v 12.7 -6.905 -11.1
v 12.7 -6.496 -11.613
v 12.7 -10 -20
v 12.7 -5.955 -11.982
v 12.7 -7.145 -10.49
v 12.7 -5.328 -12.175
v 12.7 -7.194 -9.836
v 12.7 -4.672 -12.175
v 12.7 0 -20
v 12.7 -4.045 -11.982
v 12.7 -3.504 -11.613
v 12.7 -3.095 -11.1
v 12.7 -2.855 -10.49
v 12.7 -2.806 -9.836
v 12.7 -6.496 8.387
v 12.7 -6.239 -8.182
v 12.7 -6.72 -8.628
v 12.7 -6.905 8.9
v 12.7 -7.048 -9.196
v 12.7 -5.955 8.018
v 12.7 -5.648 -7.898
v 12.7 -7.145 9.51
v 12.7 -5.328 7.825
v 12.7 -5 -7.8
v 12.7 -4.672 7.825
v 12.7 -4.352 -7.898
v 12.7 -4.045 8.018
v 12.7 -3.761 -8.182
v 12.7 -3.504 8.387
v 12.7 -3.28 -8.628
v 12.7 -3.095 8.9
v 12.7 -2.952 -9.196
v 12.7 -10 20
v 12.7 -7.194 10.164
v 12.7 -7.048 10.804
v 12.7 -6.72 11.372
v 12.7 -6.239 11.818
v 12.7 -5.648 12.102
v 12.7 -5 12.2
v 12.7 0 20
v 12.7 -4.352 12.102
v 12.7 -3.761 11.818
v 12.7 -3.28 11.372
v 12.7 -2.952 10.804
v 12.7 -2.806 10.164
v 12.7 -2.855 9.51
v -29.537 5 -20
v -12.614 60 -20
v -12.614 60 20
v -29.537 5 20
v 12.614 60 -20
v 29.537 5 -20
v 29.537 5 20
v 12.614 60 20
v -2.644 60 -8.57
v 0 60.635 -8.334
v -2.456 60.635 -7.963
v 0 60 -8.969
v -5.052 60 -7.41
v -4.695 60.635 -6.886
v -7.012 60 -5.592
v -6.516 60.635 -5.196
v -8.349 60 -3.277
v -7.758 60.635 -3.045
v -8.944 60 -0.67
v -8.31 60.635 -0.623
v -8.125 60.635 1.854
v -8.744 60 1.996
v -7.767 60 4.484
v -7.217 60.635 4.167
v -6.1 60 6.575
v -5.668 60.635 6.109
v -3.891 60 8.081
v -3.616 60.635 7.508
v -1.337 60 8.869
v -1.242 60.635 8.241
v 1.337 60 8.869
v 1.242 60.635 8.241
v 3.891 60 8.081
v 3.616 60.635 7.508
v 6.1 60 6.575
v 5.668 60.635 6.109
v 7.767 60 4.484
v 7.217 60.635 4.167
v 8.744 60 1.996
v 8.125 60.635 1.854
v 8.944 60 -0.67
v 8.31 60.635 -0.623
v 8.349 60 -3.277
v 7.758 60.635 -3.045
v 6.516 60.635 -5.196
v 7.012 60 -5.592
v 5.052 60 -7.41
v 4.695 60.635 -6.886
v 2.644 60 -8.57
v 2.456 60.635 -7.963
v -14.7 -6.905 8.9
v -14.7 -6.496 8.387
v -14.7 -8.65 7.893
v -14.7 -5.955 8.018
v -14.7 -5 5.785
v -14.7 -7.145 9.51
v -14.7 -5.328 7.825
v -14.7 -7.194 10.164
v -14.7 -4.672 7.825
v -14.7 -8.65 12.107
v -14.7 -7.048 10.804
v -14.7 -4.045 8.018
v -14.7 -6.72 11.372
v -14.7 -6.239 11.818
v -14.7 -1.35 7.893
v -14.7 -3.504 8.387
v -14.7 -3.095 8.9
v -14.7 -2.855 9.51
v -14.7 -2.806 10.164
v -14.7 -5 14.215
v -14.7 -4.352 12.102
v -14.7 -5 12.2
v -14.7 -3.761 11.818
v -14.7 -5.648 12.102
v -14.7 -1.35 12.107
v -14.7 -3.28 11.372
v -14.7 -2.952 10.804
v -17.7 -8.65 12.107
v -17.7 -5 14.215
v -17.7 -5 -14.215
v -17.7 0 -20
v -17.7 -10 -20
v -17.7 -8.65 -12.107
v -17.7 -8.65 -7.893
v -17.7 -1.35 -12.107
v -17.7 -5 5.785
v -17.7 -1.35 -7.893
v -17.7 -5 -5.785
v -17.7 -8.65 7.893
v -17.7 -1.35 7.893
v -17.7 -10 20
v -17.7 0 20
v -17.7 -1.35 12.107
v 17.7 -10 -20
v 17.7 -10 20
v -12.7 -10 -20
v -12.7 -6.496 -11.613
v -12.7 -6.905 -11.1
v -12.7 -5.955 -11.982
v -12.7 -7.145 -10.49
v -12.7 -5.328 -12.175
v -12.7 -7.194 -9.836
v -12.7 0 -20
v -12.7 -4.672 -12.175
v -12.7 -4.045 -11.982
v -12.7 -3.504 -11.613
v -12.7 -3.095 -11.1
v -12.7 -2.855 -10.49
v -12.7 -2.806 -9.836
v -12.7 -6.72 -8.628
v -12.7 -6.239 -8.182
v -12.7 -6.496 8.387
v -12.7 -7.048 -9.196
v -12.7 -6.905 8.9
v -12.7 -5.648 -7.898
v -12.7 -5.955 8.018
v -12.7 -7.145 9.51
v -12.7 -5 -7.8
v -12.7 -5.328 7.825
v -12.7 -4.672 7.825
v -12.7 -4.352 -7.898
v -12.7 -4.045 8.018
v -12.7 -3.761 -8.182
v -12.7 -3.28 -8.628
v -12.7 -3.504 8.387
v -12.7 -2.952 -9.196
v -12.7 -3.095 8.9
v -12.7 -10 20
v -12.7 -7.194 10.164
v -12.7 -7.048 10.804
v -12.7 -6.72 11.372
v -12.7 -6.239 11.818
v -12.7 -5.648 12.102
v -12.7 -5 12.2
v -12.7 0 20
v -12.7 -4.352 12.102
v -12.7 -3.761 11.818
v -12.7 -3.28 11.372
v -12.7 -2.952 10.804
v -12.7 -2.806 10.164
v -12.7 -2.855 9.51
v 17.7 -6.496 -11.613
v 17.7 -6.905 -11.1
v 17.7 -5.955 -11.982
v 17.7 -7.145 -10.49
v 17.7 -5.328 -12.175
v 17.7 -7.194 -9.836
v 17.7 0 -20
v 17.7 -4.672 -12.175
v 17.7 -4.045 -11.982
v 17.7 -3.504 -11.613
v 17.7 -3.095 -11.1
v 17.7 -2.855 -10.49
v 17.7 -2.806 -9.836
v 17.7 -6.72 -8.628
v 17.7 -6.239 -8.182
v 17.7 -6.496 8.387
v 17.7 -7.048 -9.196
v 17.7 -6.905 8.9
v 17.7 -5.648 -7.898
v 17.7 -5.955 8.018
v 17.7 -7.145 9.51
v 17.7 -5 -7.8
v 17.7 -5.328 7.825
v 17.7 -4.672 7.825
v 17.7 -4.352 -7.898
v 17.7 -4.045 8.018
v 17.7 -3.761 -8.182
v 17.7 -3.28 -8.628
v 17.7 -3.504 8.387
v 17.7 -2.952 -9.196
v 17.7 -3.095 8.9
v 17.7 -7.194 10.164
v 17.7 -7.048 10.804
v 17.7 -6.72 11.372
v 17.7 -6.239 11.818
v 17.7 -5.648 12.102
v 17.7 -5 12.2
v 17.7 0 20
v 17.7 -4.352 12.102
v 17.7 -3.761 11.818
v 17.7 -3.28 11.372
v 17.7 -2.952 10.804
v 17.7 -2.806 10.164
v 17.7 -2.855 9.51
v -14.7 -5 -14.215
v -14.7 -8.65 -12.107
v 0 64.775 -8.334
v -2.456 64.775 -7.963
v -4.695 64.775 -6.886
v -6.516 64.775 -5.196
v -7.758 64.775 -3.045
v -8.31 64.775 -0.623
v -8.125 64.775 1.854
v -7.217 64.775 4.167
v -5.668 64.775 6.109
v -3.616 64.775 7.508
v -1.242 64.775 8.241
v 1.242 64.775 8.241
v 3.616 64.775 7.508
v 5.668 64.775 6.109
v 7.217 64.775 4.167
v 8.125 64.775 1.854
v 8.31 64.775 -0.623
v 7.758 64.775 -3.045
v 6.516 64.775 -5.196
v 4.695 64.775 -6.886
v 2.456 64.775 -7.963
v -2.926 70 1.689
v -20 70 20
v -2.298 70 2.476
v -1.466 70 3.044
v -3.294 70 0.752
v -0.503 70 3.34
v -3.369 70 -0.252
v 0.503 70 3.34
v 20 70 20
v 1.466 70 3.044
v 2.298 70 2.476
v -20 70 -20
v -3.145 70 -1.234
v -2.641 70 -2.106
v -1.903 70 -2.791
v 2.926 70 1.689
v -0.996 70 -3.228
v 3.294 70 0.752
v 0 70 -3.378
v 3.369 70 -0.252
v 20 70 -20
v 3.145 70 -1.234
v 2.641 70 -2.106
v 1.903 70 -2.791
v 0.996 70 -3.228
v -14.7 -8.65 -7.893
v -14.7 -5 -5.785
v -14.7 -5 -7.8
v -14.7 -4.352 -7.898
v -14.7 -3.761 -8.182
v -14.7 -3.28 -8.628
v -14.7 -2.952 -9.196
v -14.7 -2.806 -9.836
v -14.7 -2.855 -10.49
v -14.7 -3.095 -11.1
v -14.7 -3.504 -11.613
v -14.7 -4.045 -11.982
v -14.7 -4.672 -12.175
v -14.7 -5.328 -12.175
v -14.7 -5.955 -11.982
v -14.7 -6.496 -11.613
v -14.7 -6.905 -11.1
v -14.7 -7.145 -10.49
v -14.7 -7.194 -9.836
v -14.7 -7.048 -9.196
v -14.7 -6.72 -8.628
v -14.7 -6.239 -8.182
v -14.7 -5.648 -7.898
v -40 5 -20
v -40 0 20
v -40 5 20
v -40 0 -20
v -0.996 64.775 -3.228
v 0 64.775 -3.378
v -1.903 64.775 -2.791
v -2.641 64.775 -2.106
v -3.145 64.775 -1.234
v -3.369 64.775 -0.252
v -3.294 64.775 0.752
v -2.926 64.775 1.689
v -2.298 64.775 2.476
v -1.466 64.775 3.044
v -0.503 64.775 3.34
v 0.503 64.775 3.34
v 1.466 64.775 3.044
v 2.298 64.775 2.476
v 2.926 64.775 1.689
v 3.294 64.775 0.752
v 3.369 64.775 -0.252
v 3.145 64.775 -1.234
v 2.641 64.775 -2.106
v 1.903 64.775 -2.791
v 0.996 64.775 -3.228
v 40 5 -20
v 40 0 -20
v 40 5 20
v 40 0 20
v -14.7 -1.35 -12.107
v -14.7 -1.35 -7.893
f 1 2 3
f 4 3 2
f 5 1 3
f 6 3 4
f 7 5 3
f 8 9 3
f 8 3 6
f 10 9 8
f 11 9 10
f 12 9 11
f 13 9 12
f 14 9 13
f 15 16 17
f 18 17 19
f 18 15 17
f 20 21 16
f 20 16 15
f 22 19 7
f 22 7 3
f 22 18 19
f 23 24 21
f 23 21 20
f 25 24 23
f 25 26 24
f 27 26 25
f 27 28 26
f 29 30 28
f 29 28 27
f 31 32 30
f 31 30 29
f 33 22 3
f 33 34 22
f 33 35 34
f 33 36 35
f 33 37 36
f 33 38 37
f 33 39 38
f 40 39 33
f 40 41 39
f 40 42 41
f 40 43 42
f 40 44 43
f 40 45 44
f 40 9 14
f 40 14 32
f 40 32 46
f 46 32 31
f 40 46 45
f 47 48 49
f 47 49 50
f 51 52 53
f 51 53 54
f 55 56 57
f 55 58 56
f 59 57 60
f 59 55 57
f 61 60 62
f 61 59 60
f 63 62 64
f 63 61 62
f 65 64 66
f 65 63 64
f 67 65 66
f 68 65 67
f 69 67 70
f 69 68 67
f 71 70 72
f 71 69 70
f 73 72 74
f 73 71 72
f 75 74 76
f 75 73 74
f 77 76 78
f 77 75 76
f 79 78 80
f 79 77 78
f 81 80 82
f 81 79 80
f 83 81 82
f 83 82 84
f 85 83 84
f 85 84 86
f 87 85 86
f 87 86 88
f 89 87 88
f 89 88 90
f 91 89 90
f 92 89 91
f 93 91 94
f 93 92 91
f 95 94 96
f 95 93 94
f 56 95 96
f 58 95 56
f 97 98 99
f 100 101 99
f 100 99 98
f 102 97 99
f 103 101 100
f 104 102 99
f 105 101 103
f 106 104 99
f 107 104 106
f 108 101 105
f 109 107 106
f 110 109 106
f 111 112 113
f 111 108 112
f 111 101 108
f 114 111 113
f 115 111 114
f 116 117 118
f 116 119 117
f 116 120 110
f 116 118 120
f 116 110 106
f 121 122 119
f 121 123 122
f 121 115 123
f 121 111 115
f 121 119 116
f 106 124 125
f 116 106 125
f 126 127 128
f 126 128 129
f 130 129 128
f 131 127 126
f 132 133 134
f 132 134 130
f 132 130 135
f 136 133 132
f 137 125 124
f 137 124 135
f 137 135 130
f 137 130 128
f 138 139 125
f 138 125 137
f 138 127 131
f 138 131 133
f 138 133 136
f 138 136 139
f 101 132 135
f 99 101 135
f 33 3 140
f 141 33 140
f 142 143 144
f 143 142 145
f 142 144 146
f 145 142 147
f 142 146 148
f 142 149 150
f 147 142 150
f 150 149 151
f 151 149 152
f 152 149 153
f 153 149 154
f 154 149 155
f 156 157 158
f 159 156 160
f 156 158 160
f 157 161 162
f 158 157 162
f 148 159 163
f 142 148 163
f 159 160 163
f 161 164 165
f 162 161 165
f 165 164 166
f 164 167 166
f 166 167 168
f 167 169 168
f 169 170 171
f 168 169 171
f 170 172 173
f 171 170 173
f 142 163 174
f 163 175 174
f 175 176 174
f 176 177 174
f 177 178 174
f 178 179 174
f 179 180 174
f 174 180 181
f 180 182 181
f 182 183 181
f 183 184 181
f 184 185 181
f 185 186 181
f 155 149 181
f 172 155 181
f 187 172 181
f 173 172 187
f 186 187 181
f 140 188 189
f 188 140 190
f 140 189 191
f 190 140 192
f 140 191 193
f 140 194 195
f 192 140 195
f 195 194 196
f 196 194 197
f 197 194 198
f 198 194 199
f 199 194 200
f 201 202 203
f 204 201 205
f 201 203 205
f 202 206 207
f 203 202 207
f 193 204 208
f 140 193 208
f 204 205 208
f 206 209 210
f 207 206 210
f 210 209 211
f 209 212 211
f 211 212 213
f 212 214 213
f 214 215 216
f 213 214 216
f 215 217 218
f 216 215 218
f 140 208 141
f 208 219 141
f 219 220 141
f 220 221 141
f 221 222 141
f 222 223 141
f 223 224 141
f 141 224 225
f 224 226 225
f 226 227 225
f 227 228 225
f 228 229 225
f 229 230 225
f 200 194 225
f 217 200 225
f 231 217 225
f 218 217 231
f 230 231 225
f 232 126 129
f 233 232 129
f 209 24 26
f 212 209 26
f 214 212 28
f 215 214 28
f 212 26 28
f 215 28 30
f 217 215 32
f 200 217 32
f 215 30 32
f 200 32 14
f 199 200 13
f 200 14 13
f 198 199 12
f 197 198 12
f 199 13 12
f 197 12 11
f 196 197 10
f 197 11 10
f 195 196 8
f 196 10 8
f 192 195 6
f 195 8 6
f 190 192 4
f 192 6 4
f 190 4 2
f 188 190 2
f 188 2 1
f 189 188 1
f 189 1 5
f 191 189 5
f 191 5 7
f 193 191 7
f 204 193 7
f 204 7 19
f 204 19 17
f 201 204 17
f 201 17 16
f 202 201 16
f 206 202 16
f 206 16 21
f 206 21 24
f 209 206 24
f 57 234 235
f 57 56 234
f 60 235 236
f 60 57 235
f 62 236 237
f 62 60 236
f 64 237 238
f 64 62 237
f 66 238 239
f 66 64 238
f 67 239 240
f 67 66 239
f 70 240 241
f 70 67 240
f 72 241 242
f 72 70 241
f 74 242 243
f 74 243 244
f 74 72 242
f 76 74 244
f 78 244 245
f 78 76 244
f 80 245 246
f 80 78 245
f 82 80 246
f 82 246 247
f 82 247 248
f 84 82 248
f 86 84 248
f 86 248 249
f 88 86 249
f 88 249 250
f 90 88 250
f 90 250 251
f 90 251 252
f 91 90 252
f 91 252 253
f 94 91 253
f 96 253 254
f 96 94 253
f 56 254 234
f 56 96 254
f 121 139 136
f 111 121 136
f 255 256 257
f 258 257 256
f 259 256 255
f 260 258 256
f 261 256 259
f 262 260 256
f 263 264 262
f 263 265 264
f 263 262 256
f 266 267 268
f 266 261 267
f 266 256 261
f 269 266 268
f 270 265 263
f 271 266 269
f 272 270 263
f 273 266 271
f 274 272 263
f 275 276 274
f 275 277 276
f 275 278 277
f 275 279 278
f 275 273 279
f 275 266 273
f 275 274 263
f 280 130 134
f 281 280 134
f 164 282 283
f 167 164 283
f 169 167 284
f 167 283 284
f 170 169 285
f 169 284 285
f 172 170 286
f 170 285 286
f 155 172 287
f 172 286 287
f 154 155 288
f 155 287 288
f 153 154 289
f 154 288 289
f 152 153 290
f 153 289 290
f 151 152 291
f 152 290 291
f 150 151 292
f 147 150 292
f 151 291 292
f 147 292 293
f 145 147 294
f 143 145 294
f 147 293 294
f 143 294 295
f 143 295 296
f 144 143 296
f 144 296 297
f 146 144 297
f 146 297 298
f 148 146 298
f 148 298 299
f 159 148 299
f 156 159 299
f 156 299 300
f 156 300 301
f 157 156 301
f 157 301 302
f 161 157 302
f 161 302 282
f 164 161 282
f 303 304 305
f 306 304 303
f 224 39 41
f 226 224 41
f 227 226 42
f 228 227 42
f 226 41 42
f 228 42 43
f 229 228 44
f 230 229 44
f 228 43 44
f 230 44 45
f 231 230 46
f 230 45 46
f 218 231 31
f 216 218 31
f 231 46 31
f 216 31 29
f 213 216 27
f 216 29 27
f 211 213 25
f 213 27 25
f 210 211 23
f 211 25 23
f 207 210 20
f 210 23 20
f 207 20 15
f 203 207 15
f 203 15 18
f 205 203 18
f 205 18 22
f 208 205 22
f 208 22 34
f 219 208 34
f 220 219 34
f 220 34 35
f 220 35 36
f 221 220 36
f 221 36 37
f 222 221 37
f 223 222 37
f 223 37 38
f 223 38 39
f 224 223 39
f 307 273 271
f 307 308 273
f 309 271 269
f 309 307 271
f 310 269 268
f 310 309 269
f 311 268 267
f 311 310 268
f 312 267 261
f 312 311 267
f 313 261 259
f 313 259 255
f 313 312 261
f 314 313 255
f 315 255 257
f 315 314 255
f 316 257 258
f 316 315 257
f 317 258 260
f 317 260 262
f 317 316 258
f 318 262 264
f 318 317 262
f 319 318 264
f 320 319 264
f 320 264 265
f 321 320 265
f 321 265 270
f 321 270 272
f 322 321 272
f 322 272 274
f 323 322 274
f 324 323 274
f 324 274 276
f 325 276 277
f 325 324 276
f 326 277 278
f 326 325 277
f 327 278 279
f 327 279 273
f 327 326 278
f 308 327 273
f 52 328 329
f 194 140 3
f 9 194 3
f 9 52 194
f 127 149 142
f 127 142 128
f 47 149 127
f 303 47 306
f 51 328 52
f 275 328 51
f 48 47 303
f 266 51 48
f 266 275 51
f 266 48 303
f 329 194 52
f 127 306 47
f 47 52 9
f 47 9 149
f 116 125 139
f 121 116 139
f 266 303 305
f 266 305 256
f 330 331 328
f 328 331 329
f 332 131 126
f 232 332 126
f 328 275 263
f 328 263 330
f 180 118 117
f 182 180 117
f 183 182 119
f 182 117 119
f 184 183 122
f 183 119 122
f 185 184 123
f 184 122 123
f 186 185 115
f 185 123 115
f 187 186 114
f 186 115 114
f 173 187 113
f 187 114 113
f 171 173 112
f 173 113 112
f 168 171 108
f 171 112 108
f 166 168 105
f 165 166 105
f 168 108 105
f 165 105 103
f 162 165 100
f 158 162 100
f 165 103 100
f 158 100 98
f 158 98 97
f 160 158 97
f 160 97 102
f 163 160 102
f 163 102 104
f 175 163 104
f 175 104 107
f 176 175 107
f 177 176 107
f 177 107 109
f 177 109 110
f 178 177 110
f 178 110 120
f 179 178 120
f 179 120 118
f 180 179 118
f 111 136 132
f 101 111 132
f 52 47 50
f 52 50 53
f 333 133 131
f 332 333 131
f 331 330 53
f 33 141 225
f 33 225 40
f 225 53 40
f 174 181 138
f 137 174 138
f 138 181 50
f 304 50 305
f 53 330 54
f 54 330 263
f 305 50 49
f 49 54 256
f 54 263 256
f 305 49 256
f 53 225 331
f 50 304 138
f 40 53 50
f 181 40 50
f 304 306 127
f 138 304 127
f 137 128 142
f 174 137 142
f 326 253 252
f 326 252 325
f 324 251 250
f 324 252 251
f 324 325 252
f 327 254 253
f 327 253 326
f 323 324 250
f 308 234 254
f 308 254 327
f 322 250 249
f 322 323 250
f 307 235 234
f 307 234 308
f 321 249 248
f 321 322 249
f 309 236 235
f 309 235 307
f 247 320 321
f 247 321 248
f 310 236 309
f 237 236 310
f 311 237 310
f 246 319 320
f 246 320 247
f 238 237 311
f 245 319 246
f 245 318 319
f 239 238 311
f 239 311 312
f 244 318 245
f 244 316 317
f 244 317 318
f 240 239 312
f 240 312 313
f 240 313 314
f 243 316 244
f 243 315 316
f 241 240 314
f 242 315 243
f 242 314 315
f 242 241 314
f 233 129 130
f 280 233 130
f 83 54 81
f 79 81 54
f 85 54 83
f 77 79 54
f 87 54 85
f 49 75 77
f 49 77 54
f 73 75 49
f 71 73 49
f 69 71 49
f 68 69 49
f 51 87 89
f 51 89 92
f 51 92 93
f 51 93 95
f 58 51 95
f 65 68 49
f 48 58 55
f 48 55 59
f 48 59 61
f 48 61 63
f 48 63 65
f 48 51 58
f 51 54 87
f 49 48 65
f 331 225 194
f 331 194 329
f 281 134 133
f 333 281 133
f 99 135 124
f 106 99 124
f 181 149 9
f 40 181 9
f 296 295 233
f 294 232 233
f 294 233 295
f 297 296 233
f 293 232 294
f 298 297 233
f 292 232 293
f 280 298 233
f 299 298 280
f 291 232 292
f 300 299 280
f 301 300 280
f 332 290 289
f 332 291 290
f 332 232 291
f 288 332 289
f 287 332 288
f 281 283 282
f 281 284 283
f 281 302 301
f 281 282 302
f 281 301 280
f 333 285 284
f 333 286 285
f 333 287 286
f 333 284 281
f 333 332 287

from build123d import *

# Parameters (mm, degrees)
SKETCH1_W           = 80
SKETCH1_H           = 40
BOSS_EXTRUDE1_DEPTH = 5
SKETCH2_W           = 5
SKETCH2_H           = 40
BOSS_EXTRUDE2_DEPTH = 10
SKETCH3_R           = 2.2
CUT_EXTRUDE1_DEPTH  = 62.881257259
CUT_EXTRUDE2_DEPTH  = 3
BOSS_EXTRUDE3_DEPTH = 40


with BuildPart() as part:
    # Sketch1 → Boss-Extrude1 (new body)
    with BuildSketch(Plane(origin=(0, 0, 0), x_dir=(1, 0, 0), z_dir=(0, 1, 0))):
        Rectangle(SKETCH1_W, SKETCH1_H)
    extrude(amount=BOSS_EXTRUDE1_DEPTH)

    # Sketch2 → Boss-Extrude2 (add)
    with BuildSketch(Plane.XZ):
        with Locations((15.2, 0)):
            Rectangle(SKETCH2_W, SKETCH2_H)
        with Locations((-15.2, 0)):
            Rectangle(SKETCH2_W, SKETCH2_H)
    extrude(amount=BOSS_EXTRUDE2_DEPTH)

    # Sketch3 → Cut-Extrude1 (cut, through all)
    with BuildSketch(Plane.ZY.offset(17.7)):
        with Locations((-10, -5)):
            Circle(SKETCH3_R)
        with Locations((10, -5)):
            Circle(SKETCH3_R)
    extrude(amount=-CUT_EXTRUDE1_DEPTH, mode=Mode.SUBTRACT)

    # Sketch4 → Cut-Extrude2 (cut)
    with BuildSketch(Plane.ZY.offset(17.7)):
        Polygon((-7.892671517, -1.35), (-12.107328483, -1.35), (-14.214656965, -5), (-12.107328483, -8.65), (-7.892671517, -8.65), (-5.785343035, -5), align=None)
        Polygon((12.107328483, -1.35), (7.892671517, -1.35), (5.785343035, -5), (7.892671517, -8.65), (12.107328483, -8.65), (14.214656965, -5), align=None)
    extrude(amount=-CUT_EXTRUDE2_DEPTH, mode=Mode.SUBTRACT)

    # Sketch7 → Boss-Extrude3 (add)
    with BuildSketch(Plane(origin=(0, 0, -20), x_dir=(-1, 0, 0), z_dir=(0, 0, -1))):
        Polygon((0, 70), (0, 60), (12.614253455, 60), (29.537330378, 5), (40, 5), (20, 70), align=None)
        Polygon((-12.614253455, 60), (0, 60), (0, 70), (-20, 70), (-40, 5), (-29.537330378, 5), align=None)
    extrude(amount=-BOSS_EXTRUDE3_DEPTH)

    # Sketch6 → CBORE for 1/4 Square Head Bolt1 (revolve, cut)
    with BuildSketch(Plane(origin=(0, 60, 0), x_dir=(0, 0, -1), z_dir=(1, 0, 0))):
        Polygon((0, 0), (0, 10), (3.3782, 10), (3.3782, 4.7752), (8.33374, 4.7752), (8.33374, 0.635), (8.96874, 0), align=None)
    revolve(axis=Axis((0, 53.65, 0), (0, 1, 0)), mode=Mode.SUBTRACT)


solid = part.part
